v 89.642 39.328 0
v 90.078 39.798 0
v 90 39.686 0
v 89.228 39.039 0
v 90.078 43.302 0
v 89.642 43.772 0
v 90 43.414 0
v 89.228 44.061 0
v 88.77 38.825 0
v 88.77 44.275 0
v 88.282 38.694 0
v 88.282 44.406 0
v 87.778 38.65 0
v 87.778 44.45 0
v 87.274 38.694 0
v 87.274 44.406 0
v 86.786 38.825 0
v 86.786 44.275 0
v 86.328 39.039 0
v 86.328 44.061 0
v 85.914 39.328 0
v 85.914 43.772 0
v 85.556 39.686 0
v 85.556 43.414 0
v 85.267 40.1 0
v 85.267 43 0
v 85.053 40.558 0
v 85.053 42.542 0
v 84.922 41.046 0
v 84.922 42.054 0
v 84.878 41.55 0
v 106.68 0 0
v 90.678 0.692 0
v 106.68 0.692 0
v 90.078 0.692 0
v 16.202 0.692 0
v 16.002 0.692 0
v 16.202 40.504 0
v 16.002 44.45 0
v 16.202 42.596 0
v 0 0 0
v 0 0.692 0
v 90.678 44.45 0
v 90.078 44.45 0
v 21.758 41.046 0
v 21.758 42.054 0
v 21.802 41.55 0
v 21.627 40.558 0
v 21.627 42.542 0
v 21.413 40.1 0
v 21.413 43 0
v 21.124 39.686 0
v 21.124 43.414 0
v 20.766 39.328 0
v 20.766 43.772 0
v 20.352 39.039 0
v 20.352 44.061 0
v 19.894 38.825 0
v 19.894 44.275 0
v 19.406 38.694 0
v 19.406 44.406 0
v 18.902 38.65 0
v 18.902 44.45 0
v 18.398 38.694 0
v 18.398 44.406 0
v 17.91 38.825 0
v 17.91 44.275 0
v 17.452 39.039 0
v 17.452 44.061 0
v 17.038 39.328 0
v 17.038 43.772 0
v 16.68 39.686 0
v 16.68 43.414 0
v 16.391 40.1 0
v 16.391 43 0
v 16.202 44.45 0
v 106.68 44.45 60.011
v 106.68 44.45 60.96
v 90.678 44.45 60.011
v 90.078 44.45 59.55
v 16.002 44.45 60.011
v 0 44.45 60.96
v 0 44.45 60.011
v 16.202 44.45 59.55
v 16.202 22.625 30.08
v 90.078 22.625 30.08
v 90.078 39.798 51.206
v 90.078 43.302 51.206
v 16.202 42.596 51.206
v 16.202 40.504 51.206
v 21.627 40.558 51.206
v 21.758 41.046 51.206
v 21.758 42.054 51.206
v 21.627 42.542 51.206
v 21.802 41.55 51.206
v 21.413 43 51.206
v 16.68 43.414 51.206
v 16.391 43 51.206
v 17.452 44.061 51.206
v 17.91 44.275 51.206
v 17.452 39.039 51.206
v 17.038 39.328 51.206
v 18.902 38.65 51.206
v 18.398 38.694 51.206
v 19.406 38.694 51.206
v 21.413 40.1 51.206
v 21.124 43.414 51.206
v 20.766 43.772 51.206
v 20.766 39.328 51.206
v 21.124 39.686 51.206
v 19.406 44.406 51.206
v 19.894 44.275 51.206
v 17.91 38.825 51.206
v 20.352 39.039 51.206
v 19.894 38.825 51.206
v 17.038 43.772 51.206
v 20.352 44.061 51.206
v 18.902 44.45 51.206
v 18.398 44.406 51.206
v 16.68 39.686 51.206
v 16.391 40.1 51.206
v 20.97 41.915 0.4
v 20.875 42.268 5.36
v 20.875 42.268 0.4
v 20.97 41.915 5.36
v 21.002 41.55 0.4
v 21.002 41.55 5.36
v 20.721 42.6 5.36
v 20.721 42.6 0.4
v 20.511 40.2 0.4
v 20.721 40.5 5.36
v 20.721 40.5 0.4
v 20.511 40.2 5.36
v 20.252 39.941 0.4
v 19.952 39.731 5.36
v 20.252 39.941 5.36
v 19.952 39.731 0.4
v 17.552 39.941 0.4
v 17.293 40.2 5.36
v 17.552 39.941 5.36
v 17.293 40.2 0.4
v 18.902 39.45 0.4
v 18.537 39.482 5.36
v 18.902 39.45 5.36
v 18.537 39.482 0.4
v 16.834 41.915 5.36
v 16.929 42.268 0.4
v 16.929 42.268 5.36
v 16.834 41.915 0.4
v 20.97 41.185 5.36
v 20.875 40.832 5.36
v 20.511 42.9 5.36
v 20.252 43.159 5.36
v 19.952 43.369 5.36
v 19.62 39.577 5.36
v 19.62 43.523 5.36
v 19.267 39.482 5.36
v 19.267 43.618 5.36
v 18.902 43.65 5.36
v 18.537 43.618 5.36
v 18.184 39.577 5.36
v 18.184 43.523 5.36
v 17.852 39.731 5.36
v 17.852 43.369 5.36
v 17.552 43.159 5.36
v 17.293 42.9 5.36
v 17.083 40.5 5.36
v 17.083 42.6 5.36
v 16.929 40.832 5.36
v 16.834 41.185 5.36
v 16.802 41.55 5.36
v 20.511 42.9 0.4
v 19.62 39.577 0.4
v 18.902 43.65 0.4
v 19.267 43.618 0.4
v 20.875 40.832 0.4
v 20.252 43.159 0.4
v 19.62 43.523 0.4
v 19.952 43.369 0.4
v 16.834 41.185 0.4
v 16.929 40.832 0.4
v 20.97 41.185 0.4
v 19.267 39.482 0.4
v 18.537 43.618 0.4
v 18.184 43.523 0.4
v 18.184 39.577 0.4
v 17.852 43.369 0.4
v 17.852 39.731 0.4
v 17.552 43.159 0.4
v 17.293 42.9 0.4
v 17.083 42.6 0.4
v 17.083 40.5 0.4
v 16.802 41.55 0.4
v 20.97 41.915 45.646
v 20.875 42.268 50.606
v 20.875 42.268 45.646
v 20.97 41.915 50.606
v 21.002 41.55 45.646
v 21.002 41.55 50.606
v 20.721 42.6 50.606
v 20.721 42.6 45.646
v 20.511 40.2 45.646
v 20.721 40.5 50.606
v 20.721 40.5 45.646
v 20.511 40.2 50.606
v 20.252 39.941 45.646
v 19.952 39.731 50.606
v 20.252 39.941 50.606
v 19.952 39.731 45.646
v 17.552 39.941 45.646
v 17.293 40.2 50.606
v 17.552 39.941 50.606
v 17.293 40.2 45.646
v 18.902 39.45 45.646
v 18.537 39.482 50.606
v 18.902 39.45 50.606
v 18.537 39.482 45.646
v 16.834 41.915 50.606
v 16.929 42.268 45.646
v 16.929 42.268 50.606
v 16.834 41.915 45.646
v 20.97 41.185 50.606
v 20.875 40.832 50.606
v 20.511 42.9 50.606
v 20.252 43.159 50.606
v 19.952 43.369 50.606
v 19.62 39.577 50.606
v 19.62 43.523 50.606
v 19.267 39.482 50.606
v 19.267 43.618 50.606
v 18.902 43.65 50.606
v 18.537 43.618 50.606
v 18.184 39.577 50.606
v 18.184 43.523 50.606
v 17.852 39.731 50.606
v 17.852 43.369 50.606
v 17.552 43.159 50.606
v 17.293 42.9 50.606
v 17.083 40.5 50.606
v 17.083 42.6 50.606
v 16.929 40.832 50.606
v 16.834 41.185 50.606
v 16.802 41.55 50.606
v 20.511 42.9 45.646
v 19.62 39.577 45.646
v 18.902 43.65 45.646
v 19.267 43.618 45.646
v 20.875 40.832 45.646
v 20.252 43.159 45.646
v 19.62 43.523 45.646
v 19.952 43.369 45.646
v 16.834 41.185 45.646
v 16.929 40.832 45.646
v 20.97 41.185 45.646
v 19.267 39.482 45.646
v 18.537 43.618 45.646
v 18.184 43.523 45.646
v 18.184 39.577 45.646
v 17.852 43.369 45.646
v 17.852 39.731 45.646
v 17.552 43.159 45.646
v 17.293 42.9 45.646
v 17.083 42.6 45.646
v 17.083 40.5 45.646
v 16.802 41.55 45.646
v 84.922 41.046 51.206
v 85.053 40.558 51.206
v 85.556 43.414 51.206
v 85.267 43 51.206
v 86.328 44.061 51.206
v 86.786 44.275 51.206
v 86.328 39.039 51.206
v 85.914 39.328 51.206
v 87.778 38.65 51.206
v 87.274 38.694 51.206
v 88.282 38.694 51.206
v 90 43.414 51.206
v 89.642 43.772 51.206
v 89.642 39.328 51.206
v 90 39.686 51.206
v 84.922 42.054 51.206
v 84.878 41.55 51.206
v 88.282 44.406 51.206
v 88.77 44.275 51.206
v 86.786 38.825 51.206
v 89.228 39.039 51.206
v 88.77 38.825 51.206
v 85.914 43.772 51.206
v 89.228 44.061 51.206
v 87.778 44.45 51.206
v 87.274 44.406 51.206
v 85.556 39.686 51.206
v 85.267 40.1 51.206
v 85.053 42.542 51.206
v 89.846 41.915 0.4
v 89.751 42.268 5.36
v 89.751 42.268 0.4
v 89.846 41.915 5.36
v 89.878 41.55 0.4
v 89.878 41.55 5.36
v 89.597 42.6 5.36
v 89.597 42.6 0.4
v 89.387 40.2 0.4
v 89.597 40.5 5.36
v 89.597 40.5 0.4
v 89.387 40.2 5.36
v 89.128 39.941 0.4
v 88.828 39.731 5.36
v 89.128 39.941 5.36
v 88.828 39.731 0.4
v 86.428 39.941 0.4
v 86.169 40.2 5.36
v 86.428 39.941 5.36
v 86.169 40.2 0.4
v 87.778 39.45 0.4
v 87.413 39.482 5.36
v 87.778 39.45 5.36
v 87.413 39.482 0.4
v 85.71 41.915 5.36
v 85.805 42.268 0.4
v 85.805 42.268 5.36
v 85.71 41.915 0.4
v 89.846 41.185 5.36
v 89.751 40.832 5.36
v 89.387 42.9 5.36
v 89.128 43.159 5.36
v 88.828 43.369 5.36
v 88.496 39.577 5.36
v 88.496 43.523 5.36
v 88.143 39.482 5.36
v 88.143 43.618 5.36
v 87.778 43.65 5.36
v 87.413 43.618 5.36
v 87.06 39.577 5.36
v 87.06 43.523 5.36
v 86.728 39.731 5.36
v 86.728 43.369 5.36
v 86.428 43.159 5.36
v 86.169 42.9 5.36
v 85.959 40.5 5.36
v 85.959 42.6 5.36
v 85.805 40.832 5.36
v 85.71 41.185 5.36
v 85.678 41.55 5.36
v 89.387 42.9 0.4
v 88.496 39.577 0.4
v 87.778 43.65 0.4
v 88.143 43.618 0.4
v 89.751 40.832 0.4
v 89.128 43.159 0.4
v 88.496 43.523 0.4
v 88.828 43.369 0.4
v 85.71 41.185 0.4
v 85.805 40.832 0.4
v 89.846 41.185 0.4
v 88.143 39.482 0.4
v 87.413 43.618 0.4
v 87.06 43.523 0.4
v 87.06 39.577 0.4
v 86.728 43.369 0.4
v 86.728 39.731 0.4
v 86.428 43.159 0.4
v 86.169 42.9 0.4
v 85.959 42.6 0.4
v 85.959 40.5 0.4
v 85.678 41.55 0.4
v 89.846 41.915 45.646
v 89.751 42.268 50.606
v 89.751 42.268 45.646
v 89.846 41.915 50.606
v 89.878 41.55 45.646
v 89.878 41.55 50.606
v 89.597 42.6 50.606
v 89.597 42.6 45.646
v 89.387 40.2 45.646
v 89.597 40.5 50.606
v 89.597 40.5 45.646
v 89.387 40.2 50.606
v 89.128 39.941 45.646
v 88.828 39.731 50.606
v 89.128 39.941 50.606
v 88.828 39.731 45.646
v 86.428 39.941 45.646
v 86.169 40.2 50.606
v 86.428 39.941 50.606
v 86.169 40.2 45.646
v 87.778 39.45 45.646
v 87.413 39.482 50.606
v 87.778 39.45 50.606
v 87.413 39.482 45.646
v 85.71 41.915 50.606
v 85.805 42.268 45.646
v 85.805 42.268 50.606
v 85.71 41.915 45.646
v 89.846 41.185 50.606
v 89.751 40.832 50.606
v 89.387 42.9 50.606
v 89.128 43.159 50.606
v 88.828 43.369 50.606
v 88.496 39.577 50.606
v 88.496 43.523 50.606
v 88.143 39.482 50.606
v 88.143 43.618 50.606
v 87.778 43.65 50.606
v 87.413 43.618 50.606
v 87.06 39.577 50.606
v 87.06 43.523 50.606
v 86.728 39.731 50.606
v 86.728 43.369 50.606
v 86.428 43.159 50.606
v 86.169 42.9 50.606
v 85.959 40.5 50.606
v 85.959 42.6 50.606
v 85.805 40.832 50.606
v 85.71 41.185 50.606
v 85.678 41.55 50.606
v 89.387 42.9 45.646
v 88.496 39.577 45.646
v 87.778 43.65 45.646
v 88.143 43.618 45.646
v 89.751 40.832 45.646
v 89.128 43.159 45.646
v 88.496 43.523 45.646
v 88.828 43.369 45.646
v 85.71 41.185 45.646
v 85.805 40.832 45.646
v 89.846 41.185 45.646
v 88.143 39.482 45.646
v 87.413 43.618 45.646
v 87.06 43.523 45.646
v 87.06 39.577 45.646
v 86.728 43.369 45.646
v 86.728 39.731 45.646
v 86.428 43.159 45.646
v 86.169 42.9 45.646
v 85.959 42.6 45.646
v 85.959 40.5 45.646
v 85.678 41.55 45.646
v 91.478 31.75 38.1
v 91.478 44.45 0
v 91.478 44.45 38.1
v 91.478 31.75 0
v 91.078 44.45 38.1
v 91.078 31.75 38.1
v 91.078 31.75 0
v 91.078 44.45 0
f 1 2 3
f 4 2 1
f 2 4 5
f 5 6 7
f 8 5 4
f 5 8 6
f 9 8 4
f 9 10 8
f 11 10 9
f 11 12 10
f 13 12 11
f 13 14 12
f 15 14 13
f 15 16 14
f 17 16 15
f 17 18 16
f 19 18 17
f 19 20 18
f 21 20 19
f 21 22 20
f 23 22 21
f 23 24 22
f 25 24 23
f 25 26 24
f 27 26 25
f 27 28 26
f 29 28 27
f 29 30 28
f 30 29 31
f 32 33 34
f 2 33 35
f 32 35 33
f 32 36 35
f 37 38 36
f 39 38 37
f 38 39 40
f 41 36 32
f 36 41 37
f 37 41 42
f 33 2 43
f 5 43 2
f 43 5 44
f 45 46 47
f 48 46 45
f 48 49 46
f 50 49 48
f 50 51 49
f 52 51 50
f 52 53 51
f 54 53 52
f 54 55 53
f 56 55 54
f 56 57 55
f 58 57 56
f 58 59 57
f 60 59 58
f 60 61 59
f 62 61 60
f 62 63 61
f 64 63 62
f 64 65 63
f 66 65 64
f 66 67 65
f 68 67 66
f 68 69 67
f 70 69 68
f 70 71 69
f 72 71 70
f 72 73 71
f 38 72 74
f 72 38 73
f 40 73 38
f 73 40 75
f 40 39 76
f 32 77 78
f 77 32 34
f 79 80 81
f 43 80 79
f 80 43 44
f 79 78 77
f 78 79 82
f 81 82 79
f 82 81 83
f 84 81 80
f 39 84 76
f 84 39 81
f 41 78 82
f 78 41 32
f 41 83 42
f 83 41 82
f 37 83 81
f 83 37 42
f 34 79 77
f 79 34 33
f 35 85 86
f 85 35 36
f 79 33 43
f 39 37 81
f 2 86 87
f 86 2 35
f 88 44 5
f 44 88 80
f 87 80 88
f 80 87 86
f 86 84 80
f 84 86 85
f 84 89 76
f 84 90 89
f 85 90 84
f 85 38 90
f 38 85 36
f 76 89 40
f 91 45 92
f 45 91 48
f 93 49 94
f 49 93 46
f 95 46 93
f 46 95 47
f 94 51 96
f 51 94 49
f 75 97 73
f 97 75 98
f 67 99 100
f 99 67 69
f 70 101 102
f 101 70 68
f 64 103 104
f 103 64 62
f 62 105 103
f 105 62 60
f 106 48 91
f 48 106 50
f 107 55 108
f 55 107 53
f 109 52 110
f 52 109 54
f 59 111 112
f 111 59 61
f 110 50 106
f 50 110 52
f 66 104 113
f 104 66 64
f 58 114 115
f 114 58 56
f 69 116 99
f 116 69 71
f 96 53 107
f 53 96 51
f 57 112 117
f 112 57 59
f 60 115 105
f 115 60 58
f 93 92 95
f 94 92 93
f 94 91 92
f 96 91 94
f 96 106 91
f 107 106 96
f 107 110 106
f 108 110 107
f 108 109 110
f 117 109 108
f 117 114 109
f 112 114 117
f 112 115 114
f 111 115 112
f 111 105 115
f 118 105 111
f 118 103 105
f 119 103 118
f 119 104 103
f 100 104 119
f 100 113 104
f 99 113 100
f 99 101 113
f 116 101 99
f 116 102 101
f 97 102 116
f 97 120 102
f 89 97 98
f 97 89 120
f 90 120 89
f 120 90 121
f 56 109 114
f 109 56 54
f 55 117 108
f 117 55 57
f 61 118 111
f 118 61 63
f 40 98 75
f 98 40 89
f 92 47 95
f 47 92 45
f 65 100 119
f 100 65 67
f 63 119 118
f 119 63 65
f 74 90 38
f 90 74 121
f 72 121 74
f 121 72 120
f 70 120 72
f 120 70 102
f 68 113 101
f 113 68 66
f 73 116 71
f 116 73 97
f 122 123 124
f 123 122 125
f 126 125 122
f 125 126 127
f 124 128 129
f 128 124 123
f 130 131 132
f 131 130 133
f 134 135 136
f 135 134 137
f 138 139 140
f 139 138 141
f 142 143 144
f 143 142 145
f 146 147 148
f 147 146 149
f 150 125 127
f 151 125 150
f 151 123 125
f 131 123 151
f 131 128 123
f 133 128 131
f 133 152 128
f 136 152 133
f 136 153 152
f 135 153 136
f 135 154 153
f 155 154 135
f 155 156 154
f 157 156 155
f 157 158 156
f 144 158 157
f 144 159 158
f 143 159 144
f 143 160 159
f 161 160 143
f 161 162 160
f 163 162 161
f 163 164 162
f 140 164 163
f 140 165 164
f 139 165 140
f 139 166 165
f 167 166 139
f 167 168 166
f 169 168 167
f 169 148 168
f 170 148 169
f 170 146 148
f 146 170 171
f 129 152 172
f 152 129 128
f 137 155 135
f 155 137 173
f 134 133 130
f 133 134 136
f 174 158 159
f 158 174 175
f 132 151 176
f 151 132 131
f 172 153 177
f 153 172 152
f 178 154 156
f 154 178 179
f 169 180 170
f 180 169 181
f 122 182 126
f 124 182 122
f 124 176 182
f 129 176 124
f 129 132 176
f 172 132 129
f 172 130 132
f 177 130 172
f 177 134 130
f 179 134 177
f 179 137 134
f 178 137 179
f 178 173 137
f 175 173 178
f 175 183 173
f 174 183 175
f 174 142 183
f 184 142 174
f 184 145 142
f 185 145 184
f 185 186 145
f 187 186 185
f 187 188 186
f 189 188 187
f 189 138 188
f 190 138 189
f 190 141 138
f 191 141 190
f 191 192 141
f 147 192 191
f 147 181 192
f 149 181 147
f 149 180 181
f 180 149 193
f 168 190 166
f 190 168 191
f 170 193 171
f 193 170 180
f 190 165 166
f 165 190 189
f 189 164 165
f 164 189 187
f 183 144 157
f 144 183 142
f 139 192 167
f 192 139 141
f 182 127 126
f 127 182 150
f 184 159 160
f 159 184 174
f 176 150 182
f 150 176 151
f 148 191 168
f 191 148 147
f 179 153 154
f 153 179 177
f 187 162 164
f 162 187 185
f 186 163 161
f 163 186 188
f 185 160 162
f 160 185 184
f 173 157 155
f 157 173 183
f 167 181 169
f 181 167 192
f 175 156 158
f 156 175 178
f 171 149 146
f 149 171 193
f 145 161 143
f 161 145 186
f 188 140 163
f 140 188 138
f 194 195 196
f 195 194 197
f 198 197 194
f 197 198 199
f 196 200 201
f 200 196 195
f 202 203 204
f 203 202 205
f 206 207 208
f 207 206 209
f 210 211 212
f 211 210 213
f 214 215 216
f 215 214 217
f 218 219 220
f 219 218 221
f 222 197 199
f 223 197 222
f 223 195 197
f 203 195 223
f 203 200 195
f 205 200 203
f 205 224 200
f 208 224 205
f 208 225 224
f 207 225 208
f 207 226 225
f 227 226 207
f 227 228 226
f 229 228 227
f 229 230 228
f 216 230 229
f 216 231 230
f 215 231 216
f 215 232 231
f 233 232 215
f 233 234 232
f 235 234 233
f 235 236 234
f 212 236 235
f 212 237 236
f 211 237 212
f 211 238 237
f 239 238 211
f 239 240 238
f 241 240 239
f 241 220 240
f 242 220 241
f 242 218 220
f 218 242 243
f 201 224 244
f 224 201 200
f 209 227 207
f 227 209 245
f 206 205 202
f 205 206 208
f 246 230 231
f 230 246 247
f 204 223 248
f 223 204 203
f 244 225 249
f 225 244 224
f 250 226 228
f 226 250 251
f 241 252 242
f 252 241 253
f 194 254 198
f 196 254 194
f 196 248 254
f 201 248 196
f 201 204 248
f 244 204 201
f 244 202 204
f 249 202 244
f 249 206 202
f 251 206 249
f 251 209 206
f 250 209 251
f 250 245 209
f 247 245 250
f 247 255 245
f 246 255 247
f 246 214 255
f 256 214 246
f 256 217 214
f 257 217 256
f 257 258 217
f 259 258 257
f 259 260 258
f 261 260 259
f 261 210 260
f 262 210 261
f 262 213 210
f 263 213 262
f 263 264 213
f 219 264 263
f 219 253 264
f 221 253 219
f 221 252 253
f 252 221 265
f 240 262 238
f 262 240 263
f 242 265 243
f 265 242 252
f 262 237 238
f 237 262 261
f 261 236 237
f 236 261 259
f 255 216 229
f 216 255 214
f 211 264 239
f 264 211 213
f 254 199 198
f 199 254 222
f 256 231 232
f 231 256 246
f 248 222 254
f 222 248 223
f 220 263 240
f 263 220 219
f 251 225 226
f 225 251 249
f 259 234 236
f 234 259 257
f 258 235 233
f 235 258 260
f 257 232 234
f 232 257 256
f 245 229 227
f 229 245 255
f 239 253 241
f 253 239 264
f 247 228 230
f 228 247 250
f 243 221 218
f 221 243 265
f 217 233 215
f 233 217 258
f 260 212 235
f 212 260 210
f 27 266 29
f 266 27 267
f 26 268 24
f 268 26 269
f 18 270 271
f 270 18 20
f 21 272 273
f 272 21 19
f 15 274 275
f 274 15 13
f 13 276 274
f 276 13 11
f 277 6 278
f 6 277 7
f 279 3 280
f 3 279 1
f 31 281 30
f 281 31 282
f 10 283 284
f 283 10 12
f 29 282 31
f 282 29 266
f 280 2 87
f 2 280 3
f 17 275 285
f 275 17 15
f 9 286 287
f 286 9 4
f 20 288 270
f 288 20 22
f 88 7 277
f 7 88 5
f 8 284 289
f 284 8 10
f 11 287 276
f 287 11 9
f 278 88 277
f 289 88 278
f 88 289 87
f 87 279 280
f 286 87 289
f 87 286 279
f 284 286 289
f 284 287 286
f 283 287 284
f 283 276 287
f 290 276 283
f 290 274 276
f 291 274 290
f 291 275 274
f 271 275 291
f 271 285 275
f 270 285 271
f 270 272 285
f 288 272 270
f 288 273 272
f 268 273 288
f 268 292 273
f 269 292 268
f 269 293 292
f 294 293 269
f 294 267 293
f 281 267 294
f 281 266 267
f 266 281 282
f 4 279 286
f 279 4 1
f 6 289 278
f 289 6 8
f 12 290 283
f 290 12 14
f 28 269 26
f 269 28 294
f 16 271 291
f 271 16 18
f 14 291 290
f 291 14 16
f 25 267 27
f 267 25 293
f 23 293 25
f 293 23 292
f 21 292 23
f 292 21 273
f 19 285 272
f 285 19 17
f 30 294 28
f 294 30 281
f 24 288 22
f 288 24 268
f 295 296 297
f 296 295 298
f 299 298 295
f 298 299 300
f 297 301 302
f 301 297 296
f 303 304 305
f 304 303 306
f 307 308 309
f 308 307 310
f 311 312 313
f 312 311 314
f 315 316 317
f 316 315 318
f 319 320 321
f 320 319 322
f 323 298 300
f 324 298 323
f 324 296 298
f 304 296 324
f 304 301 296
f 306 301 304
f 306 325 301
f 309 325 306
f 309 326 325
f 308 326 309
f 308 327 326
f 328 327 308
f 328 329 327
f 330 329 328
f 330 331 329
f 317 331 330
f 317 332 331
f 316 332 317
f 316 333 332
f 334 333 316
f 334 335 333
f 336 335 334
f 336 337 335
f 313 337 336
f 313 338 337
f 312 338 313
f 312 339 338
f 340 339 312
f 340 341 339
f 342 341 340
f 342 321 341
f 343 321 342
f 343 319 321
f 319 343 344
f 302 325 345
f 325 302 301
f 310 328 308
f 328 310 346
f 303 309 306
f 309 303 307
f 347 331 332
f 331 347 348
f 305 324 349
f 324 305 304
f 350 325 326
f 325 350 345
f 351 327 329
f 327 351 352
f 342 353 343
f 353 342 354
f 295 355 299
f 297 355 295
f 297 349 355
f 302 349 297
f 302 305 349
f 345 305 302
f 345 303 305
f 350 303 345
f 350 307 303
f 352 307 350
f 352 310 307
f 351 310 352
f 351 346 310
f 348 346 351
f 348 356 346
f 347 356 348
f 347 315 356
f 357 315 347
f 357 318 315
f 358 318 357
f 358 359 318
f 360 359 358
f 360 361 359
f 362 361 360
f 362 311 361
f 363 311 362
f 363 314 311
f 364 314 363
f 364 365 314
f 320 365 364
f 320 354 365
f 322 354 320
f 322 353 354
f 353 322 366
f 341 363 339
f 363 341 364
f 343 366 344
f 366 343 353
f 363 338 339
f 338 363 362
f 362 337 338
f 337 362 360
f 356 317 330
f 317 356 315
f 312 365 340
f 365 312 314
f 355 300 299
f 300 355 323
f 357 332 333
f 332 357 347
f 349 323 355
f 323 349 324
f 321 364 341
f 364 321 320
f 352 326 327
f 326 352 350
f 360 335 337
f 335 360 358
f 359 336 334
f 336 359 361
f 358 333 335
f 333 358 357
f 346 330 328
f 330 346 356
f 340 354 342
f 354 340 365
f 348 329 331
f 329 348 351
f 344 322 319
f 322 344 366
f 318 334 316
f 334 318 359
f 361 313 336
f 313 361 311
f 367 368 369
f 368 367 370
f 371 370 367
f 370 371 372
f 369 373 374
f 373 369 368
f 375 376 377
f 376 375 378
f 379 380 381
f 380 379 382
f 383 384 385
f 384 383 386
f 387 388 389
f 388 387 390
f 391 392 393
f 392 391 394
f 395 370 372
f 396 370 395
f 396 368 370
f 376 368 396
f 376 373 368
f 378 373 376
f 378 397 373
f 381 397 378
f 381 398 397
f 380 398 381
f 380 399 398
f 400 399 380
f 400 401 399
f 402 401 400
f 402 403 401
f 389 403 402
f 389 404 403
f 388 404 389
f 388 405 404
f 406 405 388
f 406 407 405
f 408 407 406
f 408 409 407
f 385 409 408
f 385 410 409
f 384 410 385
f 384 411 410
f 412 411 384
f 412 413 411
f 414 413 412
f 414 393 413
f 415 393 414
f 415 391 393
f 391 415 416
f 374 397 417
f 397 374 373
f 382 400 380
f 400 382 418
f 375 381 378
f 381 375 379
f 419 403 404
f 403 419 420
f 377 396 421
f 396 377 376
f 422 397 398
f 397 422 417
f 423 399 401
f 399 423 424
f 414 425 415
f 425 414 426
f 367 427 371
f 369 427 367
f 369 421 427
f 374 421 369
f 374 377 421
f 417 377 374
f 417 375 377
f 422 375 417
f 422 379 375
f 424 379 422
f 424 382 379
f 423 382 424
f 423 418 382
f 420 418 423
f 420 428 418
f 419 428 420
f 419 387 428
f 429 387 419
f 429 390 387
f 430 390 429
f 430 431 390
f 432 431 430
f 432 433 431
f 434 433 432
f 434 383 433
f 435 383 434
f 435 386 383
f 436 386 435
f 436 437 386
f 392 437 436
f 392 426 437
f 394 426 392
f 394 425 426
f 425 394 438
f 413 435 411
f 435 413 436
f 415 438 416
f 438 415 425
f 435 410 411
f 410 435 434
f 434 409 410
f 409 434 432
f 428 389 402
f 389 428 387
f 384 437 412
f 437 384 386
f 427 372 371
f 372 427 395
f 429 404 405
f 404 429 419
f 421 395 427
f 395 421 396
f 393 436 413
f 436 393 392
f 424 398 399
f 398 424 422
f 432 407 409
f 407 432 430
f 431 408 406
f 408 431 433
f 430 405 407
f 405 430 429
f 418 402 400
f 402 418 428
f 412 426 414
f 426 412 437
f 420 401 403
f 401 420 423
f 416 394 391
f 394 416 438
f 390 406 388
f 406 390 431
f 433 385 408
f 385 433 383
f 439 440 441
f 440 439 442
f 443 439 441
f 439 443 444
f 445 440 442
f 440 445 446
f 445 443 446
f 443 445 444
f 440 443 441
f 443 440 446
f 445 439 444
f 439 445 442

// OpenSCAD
// file: cadence.scad
// cadence eaabadf.scad
// https://github.com/jmettraux/cadence.scad


// as of 2019.05, OpenSCAD understands
// is_num, is_list, is_string, and, is_bool
//
// is_function is coming, but looks tricky



function _normalize_angle(a) =
  ((a >= 0 && a <= 360) ? a : _normalize_angle(a + (a < 0 ? 360 : -360)));


function _is_point(p) =
  is_list(p) && len(p) == 3 && is_num(p.x) && is_num(p.y) && is_num(p.z);


//
// dictionary functions

function _aaget(dict, key, default, off) =
  let (kv = dict[off])
    kv == undef ? default :
    kv[0] == key ? kv[1] :
      _aaget(dict, key, default, off + 1);

function _asget(dict, key, default, off) =
  dict[off] == undef ? default :
  dict[off] == key ? dict[off + 1] :
    _asget(dict, key, default, off + 2);

function _get(dict, key, default=undef) =
  is_string(dict[0]) ?
    _asget(dict, key, default, 0) :
    _aaget(dict, key, default, 0);

function _del(dict, key) =
  [ for (kv = dict) if (kv[0] != key) kv ];

function _put(dict, key, value) =
  concat(_del(dict, key), [ [ key, value ] ]);


function _assoc(arr, key, default, off=0) =
  let (a = arr[off])
  a == undef ? default :
  a[0] == key ? a :
  _assoc(arr, key, default, off + 1);

function _app(arr, entry) =
  concat(_del(arr, entry[0]), [ entry ]);


//
// list functions

function _idx(list, index, default=undef) =
  let (
    i = index < 0 ? len(list) + index : index,
    r = list[i]
  )
  r == undef ? default : r;

  // sublist
  //
function _slist(list, from=0, to) =
  let(
    li = len(list) - 1,
    end = (to == undef ? li : to),
    a0 = from < 0 ? li + 1 + from : from,
    a = a0 < 0 ? 0 : a0,
    z = end < 0 ? li + 1 + end : end
  )
    a > li ? [] :
    z < a ? [] :
      [ for (i = [a:z]) list[i] ];

function _reverse(list) =
  [ for (i = [ len(list) - 1 : -1 : 0 ]) list[i] ];


//
// string functions

function _sstr(s, from=0, length=undef, r="") =
  let(
    i = from < 0 ? len(s) + from : from,
    l = length == undef ? len(s) : length,
    s0 = s[i]
  )
  (s0 == undef || l < 1) ? r :
  str(r, s[i], _sstr(s, i + 1, l - 1));

function _sindex(s, s1, i=0) =
  let(
    l = len(s1),
    s0 = _sstr(s, i, l)
  )
  len(s0) < l ? undef :
  s0 == s1 ? i :
  _sindex(s, s1, i + 1);


function _ends_with(l, l1)=
  is_string(l) ? (_sstr(l, len(l) - len(l1)) == l1) :
  is_list(l) ? (_slist(l, len(l) - len(l1)) == l1) :
  false;


//
// point functions

  // Accept a single angle instead of [ angle0, angle1 ]
  // 'sp' is the start point
  //
function _to_point(length, angles, sp=[ 0, 0, 0 ]) =
  let(
    as = is_num(angles) ? [ angles, 0 ] : angles,
    inclination = as[0],
    azimuth = as[1] + 90
  )
    sp + [
      length * cos(inclination) * cos(azimuth),
      length * cos(inclination) * sin(azimuth),
      length * sin(inclination) ];

function _to_spherical(point) =
  let(
    l = norm(point),
    ele = asin(point.z / l),
    dir = atan2(point.y, point.x) - 90
  )
    [ l, [ ele, dir ] ];

function _to_spherical_xyz(point) =
  let(
    l = norm(point),
    ele = asin(point.z / l),
    dir = atan2(point.y, point.x) - 90
  )
    [ l, ele, dir ];

function _to_ele_dir(point) =
  let(
    ele = asin(point.z / l),
    dir = atan2(point.y, point.x) - 90
  )
    [ ele, dir ];


function _midpoint(p0, p1, ratio=0.5) =
  let(
    s = _to_spherical(p1 - p0)
  )
    _to_point(ratio * s[0], s[1], p0);

//function _vlen(vector) =
//  sqrt(pow(vector.x, 2) + pow(vector.y, 2) + pow(vector.z, 2));
  //
  // no, use norm(vector)


// Like rotate(rotation) { x }, but as a function, applied to a single point
//
function rotate_point(point, rotation)=
  let (
    r = rotation,
    m =
      [ [ 1, 0, 0 ], [0, cos(r.x), -sin(r.x) ], [ 0, sin(r.x), cos(r.x) ] ] *
      [ [ cos(r.y), 0, sin(r.y) ], [ 0, 1, 0 ], [ -sin(r.y), 0, cos(r.y) ] ] *
      [ [ cos(r.z), -sin(r.z), 0 ], [ sin(r.z), cos(r.z), 0 ], [ 0, 0, 1 ] ]
  )
  m * point;


// inspiration:
// https://climberg.de/post/openscad_bezier_curves_of_any_degrees

function _bezier_choose(n, k) =
  k == 0 ?  1 : (n * _bezier_choose(n - 1, k - 1)) / k;

function _bezier_point(points, t, i, c) =
  len(points) == i ?
    c :
    _bezier_point(
      points,
      t,
      i + 1,
      c +
        _bezier_choose(len(points) - 1, i) *
        pow(t, i) *
        pow(1 - t, len(points) - i - 1) * points[i]);

function _bezier_points(control_points, sample_count) =
  [ for (t = [ 0 : 1.0 / sample_count : 1 ])
    _bezier_point(control_points, t, 0, [ 0, 0, 0 ]) ];


//
// modules

module polypoints(points) {

  for (i = [ 0 : len(points) - 1 ]) {
    translate(points[i]) children(i % $children);
  }
}

module polyhulls(points) {

  for (i = [ 0 : len(points) - 2 ]) {

    hull() {
      translate(points[i]) children(i % $children);
      translate(points[i + 1]) children((i + 1) % $children);
    }
  }
}


// pineapple slice
//
module paslice(radius, depth, slice=45, radius1=0) {

  s = _normalize_angle(slice);
  r = radius;

  if (s > 0) difference() {

    cylinder(depth, r=r);

    translate([ 0, 0, -0.1 ]) cylinder(depth * 1.1, r=radius1);

    if (s != 360) {

      pas = [
        [ 0, r ], [ 0, 0 ] ];
      pbs = [
        [ r, r ], [ r, 0 ], [ r, -r ], [ 0, -r ], [ -r, -r ], [ -r, 0 ],
        [ -r, r ] ];

      t = tan(s);
      tx = t * r;
      ty = r / t;

      translate([ 0, 0, -0.1 ]) linear_extrude(depth + 0.2)
        if (s <= 45)
          polygon(concat(pas, [ [ tx, r ] ], pbs));
        else if (s <= 135)
          polygon(concat(pas, [ [ r, ty ] ], _slist(pbs, 2)));
        else if (s <= 225)
          polygon(concat(pas, [ [ -tx, -r ] ], _slist(pbs, 4)));
        else if (s <= 315)
          polygon(concat(pas, [ [ -r, -ty ] ], _slist(pbs, 6)));
        else if (s < 360)
          polygon(concat(pas, [ [ tx, r ] ]));
    }
  }
}


// dome with optional trunk_height
//
module dome(radius=-1, diameter=-1, trunk_height=0) {

  r = radius < 0 ? diameter / 2 : radius;
  th = trunk_height;

  translate([ 0, 0, th ])
    difference() {
      sphere(r=r);
      translate([ 0, 0, -r ]) cube(2 * r, center=true);
    }
  translate([ 0, 0, th / 2 ])
    cylinder(r=r, h=th, center=true);
}
// main file
//
// houses.scad
//

use <cadence.scad>;

// unit is mm

inch = 25.4;
br = 1.7; // ball radius
o2 = 0.2;
m = inch / 1.5;

bch = br * 2.8 + o2;
bpr = br + 6 * o2;


module balcyl(deeper=false) {

  h = deeper ? br * 2.8 + o2 : br * 2 + o2;
  dz = deeper ? -3 * o2 : 0;

  translate([ 0, 0, dz ])
    cylinder(r=br + 2 * o2, h=h, center=true, $fn=36);
}

module balpole(height) {

  difference() {
    translate([ 0, 0, height / 2 ])
      cylinder(r=bpr, h=height, center=true);
      h0 = 5 * o2;
      h1 = height;
      //#translate([ 0, -5, 0 ]) {
      translate([ 0, 0, bch / 2 + h0 ]) balcyl(true);
      if (height > 2 * br) translate([ 0, 0, h1 - bch / 2 ]) balcyl(true);
      //}
  }
}

module celtic_base(diameter, height, width) {

  r = diameter / 2;
  dw = height / 2;
  w2 = width / 2;
  w4 = width * 4;

  difference() {

    paslice(r, height, slice=180, radius1=r - width, $fn=16);

    translate([ 0, - r + 2, height / 3 ]) rotate([ 90, 0, 0 ])
      cylinder(r=dw, h=w4, center=true, $fn=36);
    translate([ 0, -r + 2, 0 ])
      cube(size=[ dw * 2, w4, height / 1.4 ], center=true);
  }

  translate([ bpr, r - bpr - 4 * o2, 0 ])
    balpole(height, $fn=36);

  translate([ r - bpr - 4 * o2, 0, 0 ])
    balpole(height, $fn=36);

  bph = 2 * br + 12 * o2;
  translate([ bpr, - r + bpr + 4 * o2, height - bph ])
    balpole(bph, $fn=36);
}

module celtic_roof(diameter, height) {

  difference() {
    cylinder(d1=diameter, d2=0, h=height);
    translate([ 0, 0, -5 * o2 ]) cylinder(d1=diameter, d2=0, h=height);
  }
}

//celtic_base(3 * inch, 2 * m, 1);
//celtic_roof(3.5 * inch, 2 * inch);

module tprism(l, w, h) {

  polyhedron(
    points=[
      [ 0, 0, 0 ], [ l, 0, 0 ], [ l, w, 0 ], [ 0, w, 0 ], [ 0, w, h ],
      [ l, w, h ] ],
    faces=[
      [ 0, 1, 2, 3 ], [ 5, 4, 3, 2 ], [ 0, 4, 5, 1 ], [ 0, 3, 4 ], [ 5,2,1 ] ]
  );
}

module viking_aframe(length, width, height) {

  l0 = length;

  l = length * 0.7;
  w = width / 2;
  h = height;
  wall = 2 * o2;

  bph = height * 0.84;

  difference() {
    tprism(l0, w, h);
    translate([ - l0 * 0.05, wall, - wall ]) tprism(l0 * 1.1, w, h);
  }

  ld = (length - l) / 2;

  translate([ ld, 0, 0 ]) difference() {
    tprism(l, w, h);
    translate([ wall / 2, wall / 2, - wall / 2 ])
      tprism(l - wall * 2, w + wall, h - wall);
  }

  // magnet poles

  translate([ ld + bpr, w - bpr, 0 ]) balpole(bph, $fn=36);
  translate([ ld + l - bpr, w - bpr, 0 ]) balpole(bph, $fn=36);

  // door

  dw = inch / 2;

  #translate([ ld + l + wall, w - dw, 0 ])
    cube(size=[ wall, dw, inch * 1.5 ]);
}

viking_aframe(4.2 * inch, 3.5 * inch, 2.4 * inch);
